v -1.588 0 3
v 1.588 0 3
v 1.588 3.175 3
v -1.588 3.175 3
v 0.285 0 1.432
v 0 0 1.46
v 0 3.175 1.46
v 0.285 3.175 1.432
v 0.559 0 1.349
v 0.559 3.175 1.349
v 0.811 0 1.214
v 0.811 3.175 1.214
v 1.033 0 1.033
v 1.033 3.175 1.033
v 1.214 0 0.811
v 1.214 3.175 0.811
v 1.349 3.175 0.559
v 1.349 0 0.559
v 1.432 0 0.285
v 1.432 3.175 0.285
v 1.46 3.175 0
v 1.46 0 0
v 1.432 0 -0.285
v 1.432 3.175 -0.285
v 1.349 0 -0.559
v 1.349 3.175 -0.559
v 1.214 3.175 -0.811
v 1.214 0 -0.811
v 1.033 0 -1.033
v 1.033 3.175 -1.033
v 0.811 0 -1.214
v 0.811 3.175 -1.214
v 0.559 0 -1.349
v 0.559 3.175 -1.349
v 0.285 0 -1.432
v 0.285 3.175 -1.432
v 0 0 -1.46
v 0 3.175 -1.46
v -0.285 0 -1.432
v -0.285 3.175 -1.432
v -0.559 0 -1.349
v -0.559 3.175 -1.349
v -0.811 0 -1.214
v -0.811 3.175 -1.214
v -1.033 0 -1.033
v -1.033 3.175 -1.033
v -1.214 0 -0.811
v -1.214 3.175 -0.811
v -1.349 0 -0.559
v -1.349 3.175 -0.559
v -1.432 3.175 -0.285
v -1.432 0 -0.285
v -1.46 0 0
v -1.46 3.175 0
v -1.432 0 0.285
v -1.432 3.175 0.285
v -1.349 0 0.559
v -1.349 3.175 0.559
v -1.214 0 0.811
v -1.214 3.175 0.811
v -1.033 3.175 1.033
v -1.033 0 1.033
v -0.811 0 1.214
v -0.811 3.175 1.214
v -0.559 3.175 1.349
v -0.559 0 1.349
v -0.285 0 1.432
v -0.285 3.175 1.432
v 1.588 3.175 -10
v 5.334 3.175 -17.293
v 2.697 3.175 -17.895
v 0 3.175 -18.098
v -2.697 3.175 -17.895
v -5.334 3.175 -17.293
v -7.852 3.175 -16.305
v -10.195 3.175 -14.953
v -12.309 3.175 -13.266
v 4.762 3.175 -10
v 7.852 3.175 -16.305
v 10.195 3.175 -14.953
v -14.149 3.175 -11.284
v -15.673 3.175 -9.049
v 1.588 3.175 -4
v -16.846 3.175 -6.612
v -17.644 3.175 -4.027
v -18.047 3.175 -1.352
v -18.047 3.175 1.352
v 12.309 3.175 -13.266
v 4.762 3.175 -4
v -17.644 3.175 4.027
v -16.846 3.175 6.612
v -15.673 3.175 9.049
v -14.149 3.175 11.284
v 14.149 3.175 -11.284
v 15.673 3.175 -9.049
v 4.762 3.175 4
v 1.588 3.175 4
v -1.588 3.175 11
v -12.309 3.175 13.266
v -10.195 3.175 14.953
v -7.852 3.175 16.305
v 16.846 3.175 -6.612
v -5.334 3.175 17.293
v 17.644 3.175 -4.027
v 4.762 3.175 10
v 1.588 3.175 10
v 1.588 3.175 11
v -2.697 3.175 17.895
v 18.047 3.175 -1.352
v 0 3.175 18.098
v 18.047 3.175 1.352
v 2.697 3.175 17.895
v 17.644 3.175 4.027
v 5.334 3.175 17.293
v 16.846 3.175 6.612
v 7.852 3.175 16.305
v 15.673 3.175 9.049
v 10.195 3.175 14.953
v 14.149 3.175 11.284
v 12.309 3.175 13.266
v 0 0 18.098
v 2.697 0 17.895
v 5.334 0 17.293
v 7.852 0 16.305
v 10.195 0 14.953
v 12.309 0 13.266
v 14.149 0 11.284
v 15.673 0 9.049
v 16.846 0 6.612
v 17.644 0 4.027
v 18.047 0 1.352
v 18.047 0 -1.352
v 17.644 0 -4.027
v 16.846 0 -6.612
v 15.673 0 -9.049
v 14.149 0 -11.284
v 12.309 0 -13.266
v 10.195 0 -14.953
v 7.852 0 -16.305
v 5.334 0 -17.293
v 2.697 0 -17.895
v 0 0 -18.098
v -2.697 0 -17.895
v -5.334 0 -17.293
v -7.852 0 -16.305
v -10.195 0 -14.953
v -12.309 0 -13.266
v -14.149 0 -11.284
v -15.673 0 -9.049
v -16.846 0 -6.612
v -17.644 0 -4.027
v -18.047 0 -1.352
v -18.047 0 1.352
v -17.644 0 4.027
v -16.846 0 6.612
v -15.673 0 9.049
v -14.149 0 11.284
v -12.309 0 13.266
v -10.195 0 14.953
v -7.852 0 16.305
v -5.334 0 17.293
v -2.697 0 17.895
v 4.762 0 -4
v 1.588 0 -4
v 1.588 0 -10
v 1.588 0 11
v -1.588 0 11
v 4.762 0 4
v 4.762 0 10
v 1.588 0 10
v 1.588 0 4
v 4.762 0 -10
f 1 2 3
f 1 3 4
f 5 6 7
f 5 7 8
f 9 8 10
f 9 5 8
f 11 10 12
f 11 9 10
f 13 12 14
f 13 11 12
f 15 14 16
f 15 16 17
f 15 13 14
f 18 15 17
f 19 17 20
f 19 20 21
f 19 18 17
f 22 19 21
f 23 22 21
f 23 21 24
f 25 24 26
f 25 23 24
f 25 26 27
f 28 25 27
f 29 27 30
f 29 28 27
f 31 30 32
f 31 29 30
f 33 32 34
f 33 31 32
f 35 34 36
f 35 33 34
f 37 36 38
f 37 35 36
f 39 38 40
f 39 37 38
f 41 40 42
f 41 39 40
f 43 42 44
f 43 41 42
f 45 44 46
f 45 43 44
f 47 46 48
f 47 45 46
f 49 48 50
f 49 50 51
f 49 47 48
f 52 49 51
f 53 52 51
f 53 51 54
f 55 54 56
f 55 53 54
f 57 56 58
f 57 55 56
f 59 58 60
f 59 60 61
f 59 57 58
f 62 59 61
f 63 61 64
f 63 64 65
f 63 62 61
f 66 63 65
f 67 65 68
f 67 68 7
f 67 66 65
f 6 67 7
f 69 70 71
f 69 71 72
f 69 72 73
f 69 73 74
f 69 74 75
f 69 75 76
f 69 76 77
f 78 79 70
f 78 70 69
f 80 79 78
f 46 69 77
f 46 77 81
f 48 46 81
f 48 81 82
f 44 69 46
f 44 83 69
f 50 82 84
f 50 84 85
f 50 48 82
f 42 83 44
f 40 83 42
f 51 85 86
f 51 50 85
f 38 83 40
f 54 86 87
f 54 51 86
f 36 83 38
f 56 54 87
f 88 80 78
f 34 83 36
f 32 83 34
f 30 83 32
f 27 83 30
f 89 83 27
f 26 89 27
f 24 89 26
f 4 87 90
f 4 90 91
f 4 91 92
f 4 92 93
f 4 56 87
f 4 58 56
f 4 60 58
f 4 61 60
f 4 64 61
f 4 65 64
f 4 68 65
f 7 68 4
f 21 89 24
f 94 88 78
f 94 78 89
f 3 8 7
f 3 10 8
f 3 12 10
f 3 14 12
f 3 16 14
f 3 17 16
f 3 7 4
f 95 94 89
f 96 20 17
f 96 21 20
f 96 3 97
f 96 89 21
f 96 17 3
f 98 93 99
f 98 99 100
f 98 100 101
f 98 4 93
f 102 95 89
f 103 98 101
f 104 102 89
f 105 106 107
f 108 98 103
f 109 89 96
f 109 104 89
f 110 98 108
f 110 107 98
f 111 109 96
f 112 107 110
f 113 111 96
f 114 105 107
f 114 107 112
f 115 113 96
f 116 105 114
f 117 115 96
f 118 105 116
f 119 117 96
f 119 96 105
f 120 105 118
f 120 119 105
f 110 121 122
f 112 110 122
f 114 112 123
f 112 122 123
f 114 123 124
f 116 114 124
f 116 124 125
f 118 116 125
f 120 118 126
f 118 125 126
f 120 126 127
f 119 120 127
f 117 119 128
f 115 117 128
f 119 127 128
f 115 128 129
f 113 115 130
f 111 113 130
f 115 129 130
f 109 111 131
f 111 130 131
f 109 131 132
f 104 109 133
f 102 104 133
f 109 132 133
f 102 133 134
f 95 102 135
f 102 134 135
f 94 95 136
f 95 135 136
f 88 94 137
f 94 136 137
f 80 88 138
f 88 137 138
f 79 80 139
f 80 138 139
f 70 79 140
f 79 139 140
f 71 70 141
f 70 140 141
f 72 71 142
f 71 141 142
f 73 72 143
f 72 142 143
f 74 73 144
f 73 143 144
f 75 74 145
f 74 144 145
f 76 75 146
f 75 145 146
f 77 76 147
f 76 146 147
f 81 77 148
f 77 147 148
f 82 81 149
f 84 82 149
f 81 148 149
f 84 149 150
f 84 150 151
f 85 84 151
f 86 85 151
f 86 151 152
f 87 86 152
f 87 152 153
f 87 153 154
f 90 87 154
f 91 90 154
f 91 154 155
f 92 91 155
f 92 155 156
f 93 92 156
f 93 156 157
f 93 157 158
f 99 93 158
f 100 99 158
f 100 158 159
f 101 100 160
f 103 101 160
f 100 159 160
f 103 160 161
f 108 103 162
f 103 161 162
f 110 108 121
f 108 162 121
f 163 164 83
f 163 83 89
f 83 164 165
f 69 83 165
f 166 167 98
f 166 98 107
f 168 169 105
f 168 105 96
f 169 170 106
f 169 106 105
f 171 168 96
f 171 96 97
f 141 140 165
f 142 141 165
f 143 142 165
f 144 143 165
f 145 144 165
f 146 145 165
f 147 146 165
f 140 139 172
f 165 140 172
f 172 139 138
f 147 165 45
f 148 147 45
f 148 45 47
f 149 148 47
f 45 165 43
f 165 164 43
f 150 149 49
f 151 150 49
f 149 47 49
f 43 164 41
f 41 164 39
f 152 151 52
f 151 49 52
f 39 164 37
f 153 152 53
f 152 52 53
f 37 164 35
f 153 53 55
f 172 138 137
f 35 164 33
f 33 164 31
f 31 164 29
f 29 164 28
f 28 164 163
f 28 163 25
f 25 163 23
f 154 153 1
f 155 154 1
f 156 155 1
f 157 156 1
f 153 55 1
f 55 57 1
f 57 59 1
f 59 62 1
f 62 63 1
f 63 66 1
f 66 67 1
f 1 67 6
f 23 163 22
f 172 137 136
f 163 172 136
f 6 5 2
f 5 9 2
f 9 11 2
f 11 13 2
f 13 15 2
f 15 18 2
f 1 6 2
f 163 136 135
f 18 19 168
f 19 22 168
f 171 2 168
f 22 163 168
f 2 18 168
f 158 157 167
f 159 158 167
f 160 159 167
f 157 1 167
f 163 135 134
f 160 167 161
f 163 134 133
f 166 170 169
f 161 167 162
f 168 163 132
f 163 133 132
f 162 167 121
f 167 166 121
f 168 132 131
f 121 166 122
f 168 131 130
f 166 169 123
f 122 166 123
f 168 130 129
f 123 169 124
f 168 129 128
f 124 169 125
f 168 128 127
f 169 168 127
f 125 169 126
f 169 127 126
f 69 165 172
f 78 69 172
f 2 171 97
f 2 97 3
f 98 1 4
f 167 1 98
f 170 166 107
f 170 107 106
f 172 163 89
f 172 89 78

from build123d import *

# Parameters (mm, degrees)
SKETCH1_R           = 18.0975
SKETCH1_R_2         = 1.4605
SKETCH1_W           = 3.175
SKETCH1_H           = 6
BOSS_EXTRUDE1_DEPTH = 3.175


with BuildPart() as part:
    # Sketch1 → Boss-Extrude1 (new body)
    with BuildSketch(Plane(origin=(0, 0, 0), x_dir=(1, 0, 0), z_dir=(0, 1, 0))):
        with Locations(Location((0, 0, 0), (0, 0, 270))):
            Circle(SKETCH1_R)
        with Locations(Location((0, 0, 0), (0, 0, 270))):
            Circle(SKETCH1_R_2, mode=Mode.SUBTRACT)
        Polygon((1.5875, -4), (1.5875, -3), (-1.5875, -3), (-1.5875, -11), (1.5875, -11), (1.5875, -10), (4.7625, -10), (4.7625, -4), align=None, mode=Mode.SUBTRACT)
        with Locations((3.175, 7)):
            Rectangle(SKETCH1_W, SKETCH1_H, mode=Mode.SUBTRACT)
    extrude(amount=BOSS_EXTRUDE1_DEPTH)


solid = part.part
